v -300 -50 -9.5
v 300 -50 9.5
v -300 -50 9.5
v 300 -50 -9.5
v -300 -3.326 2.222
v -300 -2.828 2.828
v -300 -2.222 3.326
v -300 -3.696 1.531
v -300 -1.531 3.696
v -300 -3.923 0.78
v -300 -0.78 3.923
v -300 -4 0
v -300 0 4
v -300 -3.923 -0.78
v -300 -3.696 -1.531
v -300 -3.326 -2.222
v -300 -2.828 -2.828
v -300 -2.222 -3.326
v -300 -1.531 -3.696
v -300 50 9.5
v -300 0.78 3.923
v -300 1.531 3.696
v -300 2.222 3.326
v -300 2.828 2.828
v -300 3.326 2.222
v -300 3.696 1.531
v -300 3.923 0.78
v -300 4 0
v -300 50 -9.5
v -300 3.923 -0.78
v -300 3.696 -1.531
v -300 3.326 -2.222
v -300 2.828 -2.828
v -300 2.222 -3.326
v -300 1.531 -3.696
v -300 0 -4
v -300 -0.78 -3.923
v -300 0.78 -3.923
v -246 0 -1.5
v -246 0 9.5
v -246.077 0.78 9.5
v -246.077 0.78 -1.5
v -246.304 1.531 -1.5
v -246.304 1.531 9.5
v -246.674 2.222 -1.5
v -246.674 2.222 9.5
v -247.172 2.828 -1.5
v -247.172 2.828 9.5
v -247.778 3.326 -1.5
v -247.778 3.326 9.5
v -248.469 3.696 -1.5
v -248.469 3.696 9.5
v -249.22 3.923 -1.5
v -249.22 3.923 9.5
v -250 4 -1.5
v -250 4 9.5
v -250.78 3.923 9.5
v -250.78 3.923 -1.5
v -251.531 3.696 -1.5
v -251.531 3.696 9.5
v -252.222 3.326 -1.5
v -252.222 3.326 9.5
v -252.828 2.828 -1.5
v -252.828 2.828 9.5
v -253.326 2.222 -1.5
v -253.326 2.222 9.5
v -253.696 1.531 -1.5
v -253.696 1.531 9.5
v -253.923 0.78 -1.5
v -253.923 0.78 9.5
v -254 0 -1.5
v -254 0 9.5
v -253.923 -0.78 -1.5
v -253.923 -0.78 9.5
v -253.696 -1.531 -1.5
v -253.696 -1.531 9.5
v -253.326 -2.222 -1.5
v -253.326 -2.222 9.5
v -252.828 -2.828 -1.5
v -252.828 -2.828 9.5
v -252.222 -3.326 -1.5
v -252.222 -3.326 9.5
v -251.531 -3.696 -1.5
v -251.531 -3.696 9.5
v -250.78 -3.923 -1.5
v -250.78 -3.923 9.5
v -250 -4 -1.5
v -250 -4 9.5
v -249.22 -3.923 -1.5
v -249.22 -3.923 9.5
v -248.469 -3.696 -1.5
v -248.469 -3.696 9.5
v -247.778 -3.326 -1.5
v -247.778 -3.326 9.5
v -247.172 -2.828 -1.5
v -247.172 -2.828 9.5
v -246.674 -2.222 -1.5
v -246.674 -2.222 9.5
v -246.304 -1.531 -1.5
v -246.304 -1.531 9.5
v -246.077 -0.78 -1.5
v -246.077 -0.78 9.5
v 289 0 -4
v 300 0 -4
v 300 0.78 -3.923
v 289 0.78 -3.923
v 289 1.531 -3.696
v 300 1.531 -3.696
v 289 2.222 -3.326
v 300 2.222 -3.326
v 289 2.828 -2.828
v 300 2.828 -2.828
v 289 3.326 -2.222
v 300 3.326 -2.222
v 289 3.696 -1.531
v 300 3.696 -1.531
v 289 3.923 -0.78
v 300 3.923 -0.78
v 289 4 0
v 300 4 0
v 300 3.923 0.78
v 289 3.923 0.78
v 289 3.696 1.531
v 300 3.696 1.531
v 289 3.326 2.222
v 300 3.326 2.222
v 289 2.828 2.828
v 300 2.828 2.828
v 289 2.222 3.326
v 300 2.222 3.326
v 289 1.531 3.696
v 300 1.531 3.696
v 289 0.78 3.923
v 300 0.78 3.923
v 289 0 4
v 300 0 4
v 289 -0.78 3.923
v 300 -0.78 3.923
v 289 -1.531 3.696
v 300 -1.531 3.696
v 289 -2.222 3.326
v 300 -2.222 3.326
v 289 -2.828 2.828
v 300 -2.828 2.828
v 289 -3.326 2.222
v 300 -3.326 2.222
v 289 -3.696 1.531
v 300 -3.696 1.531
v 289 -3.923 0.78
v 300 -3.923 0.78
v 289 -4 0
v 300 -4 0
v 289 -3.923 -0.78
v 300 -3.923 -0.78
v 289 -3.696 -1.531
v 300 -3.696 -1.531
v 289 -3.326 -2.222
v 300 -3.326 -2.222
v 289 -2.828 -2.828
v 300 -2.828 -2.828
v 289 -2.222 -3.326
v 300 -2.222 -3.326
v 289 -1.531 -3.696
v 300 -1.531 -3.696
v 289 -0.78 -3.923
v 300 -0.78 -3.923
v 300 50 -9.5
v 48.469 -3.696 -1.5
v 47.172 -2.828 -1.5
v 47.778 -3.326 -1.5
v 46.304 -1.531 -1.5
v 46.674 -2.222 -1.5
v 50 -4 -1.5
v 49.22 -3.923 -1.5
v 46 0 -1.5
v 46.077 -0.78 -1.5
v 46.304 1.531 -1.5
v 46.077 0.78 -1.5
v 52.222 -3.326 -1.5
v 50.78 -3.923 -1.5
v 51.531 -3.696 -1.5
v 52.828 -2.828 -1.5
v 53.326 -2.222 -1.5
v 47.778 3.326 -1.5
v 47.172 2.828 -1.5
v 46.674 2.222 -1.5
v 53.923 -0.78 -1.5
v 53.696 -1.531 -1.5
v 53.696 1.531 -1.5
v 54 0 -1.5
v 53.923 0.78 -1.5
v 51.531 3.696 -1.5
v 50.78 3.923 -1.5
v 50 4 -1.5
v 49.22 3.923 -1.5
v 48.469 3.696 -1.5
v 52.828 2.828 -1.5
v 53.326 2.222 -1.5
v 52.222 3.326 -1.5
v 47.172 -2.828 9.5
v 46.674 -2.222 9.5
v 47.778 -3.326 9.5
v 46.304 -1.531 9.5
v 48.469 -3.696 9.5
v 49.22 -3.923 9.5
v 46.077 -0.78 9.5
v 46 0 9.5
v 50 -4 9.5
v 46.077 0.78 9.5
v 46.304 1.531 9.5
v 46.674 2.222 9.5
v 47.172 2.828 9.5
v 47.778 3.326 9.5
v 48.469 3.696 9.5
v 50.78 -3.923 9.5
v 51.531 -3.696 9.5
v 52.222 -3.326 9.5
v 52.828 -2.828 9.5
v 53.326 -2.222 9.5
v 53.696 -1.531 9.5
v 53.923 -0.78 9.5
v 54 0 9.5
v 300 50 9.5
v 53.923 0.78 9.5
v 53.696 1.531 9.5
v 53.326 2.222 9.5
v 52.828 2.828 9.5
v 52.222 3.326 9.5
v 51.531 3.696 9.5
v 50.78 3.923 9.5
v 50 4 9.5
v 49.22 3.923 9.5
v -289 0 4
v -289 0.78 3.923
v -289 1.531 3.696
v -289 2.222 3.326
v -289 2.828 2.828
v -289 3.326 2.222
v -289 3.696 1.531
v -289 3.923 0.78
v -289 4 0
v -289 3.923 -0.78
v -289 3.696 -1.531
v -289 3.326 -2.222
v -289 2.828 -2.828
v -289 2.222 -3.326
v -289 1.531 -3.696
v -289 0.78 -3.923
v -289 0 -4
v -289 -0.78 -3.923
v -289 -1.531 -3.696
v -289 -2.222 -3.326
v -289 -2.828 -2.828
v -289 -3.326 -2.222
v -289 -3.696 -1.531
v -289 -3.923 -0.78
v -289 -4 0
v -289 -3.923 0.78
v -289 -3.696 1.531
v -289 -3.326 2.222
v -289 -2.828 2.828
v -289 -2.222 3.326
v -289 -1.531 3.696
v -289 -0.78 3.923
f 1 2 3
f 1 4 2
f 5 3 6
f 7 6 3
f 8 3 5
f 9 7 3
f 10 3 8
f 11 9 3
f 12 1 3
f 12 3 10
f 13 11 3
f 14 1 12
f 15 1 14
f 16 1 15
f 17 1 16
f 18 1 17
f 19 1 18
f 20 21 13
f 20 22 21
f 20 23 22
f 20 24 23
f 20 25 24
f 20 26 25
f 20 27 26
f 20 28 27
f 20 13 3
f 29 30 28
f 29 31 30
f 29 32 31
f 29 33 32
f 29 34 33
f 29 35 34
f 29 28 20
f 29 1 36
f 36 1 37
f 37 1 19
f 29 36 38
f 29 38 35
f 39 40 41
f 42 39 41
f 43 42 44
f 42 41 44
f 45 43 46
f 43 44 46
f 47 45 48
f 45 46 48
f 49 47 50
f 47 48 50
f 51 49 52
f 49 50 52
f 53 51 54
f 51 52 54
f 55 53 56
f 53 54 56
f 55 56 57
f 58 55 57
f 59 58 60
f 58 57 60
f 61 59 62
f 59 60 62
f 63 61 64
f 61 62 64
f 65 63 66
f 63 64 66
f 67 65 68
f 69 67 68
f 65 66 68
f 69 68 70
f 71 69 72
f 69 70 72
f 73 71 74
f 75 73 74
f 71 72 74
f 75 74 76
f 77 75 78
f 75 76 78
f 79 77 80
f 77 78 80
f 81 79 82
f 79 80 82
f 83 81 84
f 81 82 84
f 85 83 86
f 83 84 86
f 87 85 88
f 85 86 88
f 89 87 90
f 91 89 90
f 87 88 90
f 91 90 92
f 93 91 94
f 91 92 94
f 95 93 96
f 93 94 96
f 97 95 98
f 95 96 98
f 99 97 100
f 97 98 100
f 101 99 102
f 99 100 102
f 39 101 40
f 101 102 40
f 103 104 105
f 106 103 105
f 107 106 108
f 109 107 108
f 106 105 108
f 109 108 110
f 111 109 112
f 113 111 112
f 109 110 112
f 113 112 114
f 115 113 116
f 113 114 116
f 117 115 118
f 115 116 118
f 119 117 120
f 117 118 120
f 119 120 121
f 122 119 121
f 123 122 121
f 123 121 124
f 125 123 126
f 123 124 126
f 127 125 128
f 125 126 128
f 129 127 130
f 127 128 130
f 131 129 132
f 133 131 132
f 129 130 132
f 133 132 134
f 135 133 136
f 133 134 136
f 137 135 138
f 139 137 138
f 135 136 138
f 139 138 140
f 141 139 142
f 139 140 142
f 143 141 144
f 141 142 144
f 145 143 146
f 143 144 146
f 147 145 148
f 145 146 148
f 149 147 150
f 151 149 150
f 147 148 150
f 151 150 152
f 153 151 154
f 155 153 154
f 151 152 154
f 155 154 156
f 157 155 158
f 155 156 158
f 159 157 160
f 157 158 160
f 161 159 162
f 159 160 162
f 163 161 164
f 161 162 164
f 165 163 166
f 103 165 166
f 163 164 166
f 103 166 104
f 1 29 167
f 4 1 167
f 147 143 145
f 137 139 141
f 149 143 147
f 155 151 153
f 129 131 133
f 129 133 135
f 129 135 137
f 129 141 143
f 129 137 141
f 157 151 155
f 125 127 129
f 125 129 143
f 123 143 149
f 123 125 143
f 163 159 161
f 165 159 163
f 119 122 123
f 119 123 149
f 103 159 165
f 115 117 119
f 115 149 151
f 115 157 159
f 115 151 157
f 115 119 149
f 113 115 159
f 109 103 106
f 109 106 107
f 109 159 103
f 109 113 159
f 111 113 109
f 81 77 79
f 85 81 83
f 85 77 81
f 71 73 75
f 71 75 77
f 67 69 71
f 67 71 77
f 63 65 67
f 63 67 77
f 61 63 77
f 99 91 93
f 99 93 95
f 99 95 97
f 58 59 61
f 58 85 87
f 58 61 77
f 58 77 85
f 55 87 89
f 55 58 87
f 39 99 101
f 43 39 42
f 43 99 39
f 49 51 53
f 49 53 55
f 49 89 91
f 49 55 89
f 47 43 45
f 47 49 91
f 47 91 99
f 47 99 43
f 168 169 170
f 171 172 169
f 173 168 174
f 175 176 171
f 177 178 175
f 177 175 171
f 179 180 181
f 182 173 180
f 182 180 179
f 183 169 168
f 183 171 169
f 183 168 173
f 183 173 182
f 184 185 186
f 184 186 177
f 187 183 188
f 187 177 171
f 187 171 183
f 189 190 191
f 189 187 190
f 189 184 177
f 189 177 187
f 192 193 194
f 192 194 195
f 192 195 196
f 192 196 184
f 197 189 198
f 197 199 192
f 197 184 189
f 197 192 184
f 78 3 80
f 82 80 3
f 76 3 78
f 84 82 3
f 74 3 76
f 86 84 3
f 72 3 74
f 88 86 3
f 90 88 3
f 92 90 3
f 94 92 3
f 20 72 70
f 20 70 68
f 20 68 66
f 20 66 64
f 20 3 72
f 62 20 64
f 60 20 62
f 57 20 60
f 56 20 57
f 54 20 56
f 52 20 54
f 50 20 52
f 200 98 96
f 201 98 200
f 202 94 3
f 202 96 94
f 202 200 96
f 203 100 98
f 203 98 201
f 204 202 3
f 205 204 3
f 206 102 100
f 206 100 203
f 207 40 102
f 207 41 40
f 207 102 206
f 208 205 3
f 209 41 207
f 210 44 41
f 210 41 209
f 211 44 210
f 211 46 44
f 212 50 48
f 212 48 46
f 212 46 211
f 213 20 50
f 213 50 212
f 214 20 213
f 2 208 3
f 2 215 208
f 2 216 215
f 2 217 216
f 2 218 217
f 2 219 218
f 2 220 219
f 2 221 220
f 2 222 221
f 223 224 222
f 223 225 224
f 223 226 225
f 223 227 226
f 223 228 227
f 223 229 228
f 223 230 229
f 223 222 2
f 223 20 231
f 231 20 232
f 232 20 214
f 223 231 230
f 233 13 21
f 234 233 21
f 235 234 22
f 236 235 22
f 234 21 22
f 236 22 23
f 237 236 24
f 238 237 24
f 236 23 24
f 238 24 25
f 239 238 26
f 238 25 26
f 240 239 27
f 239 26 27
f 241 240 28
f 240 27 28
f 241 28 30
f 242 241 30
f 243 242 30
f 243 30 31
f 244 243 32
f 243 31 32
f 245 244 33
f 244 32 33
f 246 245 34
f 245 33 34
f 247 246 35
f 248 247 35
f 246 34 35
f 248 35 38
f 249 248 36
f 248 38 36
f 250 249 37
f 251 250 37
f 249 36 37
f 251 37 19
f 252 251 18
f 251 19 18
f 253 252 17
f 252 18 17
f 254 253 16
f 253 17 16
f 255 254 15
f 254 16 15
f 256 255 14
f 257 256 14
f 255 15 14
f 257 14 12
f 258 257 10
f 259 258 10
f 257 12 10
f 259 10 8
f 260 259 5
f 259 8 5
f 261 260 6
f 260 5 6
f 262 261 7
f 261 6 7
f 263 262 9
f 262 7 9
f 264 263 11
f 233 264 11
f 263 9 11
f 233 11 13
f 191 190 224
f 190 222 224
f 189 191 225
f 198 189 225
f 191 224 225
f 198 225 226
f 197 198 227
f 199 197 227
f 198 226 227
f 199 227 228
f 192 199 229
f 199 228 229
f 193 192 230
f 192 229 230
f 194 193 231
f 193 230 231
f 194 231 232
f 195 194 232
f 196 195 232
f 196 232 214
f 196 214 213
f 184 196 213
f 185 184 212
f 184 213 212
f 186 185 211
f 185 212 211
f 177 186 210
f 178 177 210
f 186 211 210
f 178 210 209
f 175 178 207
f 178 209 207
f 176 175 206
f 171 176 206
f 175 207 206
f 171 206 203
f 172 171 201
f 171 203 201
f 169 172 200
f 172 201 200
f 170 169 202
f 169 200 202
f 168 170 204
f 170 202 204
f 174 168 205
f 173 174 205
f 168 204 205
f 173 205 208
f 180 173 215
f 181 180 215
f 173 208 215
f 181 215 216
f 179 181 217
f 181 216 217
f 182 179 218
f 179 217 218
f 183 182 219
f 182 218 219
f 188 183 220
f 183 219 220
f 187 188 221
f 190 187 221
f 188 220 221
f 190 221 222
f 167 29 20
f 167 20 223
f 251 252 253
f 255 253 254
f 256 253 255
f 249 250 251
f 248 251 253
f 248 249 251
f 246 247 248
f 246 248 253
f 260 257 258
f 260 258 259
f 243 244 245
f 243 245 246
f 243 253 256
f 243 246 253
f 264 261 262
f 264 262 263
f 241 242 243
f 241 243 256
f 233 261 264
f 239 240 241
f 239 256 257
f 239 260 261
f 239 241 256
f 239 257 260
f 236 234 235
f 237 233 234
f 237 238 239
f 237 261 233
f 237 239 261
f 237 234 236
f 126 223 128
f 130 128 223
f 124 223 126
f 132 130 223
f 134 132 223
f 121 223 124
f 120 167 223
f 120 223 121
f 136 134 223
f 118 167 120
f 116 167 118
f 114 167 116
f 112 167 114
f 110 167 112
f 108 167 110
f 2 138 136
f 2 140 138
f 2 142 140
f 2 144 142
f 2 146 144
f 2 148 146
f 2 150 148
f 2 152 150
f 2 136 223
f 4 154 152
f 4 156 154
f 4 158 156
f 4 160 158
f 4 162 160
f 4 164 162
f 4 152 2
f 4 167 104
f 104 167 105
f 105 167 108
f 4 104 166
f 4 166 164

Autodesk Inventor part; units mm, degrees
ref_plane "YZ Plane" through (0, 0, 0) normal (1, 0, 0) x (0, 1, 0)
ref_plane "XZ Plane" through (0, 0, 0) normal (0, 1, 0) x (-1, 0, 0)
ref_plane "XY Plane" through (0, 0, 0) normal (0, 0, 1) x (1, 0, 0)
sketch "Sketch1" plane through (0, 0, 0) normal (0, 0, 1) x (1, 0, 0)
  point P0 (0, 0)
sketch "Sketch2" plane through (0, 0, 0) normal (0, 0, 1) x (1, 0, 0)
  line L0 (300, -50) -> (-300, -50)
  line L1 (-300, -50) -> (-300, 50)
  line L2 (-300, 50) -> (300, 50)
  line L3 (300, 50) -> (300, -50)
  line L4 (300, -50) -> (-300, 50) construction
  line L5 (-300, -50) -> (300, 50) construction
  point P0 (0, 0)
  dimension "d0" = 600
  dimension "d1" = 100
extrude "Extrusion1" add sketch "Sketch2" along normal blind 9.5 and the other way blind 9.5
sketch "Sketch3" plane through (0, 0, 9.5) normal (0, 0, 1) x (1, 0, 0)
  line L0 (-300, 50) -> (-300, -50) projected
  line L1 (-300, 0) -> (-250, 0)
  line L2 (300, -50) -> (300, 50) projected
  line L3 (300, 0) -> (50, 0)
  circle A0 centre (-250, 0) radius 4
  circle A1 centre (50, 0) radius 4
  point P0 (0, 0)
  dimension "d6" = 50
  dimension "d7" = 250
  dimension "d8" = 8
  dimension "d9" = 8
extrude "Extrusion2" cut sketch "Sketch3" against normal blind 11
sketch "Sketch4" plane through (300, -50, 9.5) normal (1, 0, 0) x (0, 0, -1)
  circle A0 centre (9.5, 50) radius 4
  dimension "d12" = 8
extrude "Extrusion3" cut sketch "Sketch4" against normal blind 11
sketch "Sketch5" plane through (-300, -50, 9.5) normal (-1, 0, 0) x (0, 0, 1)
  circle A0 centre (-9.5, 50) radius 4
  dimension "d15" = 8
extrude "Extrusion4" cut sketch "Sketch5" against normal blind 11
properties part number "B"
